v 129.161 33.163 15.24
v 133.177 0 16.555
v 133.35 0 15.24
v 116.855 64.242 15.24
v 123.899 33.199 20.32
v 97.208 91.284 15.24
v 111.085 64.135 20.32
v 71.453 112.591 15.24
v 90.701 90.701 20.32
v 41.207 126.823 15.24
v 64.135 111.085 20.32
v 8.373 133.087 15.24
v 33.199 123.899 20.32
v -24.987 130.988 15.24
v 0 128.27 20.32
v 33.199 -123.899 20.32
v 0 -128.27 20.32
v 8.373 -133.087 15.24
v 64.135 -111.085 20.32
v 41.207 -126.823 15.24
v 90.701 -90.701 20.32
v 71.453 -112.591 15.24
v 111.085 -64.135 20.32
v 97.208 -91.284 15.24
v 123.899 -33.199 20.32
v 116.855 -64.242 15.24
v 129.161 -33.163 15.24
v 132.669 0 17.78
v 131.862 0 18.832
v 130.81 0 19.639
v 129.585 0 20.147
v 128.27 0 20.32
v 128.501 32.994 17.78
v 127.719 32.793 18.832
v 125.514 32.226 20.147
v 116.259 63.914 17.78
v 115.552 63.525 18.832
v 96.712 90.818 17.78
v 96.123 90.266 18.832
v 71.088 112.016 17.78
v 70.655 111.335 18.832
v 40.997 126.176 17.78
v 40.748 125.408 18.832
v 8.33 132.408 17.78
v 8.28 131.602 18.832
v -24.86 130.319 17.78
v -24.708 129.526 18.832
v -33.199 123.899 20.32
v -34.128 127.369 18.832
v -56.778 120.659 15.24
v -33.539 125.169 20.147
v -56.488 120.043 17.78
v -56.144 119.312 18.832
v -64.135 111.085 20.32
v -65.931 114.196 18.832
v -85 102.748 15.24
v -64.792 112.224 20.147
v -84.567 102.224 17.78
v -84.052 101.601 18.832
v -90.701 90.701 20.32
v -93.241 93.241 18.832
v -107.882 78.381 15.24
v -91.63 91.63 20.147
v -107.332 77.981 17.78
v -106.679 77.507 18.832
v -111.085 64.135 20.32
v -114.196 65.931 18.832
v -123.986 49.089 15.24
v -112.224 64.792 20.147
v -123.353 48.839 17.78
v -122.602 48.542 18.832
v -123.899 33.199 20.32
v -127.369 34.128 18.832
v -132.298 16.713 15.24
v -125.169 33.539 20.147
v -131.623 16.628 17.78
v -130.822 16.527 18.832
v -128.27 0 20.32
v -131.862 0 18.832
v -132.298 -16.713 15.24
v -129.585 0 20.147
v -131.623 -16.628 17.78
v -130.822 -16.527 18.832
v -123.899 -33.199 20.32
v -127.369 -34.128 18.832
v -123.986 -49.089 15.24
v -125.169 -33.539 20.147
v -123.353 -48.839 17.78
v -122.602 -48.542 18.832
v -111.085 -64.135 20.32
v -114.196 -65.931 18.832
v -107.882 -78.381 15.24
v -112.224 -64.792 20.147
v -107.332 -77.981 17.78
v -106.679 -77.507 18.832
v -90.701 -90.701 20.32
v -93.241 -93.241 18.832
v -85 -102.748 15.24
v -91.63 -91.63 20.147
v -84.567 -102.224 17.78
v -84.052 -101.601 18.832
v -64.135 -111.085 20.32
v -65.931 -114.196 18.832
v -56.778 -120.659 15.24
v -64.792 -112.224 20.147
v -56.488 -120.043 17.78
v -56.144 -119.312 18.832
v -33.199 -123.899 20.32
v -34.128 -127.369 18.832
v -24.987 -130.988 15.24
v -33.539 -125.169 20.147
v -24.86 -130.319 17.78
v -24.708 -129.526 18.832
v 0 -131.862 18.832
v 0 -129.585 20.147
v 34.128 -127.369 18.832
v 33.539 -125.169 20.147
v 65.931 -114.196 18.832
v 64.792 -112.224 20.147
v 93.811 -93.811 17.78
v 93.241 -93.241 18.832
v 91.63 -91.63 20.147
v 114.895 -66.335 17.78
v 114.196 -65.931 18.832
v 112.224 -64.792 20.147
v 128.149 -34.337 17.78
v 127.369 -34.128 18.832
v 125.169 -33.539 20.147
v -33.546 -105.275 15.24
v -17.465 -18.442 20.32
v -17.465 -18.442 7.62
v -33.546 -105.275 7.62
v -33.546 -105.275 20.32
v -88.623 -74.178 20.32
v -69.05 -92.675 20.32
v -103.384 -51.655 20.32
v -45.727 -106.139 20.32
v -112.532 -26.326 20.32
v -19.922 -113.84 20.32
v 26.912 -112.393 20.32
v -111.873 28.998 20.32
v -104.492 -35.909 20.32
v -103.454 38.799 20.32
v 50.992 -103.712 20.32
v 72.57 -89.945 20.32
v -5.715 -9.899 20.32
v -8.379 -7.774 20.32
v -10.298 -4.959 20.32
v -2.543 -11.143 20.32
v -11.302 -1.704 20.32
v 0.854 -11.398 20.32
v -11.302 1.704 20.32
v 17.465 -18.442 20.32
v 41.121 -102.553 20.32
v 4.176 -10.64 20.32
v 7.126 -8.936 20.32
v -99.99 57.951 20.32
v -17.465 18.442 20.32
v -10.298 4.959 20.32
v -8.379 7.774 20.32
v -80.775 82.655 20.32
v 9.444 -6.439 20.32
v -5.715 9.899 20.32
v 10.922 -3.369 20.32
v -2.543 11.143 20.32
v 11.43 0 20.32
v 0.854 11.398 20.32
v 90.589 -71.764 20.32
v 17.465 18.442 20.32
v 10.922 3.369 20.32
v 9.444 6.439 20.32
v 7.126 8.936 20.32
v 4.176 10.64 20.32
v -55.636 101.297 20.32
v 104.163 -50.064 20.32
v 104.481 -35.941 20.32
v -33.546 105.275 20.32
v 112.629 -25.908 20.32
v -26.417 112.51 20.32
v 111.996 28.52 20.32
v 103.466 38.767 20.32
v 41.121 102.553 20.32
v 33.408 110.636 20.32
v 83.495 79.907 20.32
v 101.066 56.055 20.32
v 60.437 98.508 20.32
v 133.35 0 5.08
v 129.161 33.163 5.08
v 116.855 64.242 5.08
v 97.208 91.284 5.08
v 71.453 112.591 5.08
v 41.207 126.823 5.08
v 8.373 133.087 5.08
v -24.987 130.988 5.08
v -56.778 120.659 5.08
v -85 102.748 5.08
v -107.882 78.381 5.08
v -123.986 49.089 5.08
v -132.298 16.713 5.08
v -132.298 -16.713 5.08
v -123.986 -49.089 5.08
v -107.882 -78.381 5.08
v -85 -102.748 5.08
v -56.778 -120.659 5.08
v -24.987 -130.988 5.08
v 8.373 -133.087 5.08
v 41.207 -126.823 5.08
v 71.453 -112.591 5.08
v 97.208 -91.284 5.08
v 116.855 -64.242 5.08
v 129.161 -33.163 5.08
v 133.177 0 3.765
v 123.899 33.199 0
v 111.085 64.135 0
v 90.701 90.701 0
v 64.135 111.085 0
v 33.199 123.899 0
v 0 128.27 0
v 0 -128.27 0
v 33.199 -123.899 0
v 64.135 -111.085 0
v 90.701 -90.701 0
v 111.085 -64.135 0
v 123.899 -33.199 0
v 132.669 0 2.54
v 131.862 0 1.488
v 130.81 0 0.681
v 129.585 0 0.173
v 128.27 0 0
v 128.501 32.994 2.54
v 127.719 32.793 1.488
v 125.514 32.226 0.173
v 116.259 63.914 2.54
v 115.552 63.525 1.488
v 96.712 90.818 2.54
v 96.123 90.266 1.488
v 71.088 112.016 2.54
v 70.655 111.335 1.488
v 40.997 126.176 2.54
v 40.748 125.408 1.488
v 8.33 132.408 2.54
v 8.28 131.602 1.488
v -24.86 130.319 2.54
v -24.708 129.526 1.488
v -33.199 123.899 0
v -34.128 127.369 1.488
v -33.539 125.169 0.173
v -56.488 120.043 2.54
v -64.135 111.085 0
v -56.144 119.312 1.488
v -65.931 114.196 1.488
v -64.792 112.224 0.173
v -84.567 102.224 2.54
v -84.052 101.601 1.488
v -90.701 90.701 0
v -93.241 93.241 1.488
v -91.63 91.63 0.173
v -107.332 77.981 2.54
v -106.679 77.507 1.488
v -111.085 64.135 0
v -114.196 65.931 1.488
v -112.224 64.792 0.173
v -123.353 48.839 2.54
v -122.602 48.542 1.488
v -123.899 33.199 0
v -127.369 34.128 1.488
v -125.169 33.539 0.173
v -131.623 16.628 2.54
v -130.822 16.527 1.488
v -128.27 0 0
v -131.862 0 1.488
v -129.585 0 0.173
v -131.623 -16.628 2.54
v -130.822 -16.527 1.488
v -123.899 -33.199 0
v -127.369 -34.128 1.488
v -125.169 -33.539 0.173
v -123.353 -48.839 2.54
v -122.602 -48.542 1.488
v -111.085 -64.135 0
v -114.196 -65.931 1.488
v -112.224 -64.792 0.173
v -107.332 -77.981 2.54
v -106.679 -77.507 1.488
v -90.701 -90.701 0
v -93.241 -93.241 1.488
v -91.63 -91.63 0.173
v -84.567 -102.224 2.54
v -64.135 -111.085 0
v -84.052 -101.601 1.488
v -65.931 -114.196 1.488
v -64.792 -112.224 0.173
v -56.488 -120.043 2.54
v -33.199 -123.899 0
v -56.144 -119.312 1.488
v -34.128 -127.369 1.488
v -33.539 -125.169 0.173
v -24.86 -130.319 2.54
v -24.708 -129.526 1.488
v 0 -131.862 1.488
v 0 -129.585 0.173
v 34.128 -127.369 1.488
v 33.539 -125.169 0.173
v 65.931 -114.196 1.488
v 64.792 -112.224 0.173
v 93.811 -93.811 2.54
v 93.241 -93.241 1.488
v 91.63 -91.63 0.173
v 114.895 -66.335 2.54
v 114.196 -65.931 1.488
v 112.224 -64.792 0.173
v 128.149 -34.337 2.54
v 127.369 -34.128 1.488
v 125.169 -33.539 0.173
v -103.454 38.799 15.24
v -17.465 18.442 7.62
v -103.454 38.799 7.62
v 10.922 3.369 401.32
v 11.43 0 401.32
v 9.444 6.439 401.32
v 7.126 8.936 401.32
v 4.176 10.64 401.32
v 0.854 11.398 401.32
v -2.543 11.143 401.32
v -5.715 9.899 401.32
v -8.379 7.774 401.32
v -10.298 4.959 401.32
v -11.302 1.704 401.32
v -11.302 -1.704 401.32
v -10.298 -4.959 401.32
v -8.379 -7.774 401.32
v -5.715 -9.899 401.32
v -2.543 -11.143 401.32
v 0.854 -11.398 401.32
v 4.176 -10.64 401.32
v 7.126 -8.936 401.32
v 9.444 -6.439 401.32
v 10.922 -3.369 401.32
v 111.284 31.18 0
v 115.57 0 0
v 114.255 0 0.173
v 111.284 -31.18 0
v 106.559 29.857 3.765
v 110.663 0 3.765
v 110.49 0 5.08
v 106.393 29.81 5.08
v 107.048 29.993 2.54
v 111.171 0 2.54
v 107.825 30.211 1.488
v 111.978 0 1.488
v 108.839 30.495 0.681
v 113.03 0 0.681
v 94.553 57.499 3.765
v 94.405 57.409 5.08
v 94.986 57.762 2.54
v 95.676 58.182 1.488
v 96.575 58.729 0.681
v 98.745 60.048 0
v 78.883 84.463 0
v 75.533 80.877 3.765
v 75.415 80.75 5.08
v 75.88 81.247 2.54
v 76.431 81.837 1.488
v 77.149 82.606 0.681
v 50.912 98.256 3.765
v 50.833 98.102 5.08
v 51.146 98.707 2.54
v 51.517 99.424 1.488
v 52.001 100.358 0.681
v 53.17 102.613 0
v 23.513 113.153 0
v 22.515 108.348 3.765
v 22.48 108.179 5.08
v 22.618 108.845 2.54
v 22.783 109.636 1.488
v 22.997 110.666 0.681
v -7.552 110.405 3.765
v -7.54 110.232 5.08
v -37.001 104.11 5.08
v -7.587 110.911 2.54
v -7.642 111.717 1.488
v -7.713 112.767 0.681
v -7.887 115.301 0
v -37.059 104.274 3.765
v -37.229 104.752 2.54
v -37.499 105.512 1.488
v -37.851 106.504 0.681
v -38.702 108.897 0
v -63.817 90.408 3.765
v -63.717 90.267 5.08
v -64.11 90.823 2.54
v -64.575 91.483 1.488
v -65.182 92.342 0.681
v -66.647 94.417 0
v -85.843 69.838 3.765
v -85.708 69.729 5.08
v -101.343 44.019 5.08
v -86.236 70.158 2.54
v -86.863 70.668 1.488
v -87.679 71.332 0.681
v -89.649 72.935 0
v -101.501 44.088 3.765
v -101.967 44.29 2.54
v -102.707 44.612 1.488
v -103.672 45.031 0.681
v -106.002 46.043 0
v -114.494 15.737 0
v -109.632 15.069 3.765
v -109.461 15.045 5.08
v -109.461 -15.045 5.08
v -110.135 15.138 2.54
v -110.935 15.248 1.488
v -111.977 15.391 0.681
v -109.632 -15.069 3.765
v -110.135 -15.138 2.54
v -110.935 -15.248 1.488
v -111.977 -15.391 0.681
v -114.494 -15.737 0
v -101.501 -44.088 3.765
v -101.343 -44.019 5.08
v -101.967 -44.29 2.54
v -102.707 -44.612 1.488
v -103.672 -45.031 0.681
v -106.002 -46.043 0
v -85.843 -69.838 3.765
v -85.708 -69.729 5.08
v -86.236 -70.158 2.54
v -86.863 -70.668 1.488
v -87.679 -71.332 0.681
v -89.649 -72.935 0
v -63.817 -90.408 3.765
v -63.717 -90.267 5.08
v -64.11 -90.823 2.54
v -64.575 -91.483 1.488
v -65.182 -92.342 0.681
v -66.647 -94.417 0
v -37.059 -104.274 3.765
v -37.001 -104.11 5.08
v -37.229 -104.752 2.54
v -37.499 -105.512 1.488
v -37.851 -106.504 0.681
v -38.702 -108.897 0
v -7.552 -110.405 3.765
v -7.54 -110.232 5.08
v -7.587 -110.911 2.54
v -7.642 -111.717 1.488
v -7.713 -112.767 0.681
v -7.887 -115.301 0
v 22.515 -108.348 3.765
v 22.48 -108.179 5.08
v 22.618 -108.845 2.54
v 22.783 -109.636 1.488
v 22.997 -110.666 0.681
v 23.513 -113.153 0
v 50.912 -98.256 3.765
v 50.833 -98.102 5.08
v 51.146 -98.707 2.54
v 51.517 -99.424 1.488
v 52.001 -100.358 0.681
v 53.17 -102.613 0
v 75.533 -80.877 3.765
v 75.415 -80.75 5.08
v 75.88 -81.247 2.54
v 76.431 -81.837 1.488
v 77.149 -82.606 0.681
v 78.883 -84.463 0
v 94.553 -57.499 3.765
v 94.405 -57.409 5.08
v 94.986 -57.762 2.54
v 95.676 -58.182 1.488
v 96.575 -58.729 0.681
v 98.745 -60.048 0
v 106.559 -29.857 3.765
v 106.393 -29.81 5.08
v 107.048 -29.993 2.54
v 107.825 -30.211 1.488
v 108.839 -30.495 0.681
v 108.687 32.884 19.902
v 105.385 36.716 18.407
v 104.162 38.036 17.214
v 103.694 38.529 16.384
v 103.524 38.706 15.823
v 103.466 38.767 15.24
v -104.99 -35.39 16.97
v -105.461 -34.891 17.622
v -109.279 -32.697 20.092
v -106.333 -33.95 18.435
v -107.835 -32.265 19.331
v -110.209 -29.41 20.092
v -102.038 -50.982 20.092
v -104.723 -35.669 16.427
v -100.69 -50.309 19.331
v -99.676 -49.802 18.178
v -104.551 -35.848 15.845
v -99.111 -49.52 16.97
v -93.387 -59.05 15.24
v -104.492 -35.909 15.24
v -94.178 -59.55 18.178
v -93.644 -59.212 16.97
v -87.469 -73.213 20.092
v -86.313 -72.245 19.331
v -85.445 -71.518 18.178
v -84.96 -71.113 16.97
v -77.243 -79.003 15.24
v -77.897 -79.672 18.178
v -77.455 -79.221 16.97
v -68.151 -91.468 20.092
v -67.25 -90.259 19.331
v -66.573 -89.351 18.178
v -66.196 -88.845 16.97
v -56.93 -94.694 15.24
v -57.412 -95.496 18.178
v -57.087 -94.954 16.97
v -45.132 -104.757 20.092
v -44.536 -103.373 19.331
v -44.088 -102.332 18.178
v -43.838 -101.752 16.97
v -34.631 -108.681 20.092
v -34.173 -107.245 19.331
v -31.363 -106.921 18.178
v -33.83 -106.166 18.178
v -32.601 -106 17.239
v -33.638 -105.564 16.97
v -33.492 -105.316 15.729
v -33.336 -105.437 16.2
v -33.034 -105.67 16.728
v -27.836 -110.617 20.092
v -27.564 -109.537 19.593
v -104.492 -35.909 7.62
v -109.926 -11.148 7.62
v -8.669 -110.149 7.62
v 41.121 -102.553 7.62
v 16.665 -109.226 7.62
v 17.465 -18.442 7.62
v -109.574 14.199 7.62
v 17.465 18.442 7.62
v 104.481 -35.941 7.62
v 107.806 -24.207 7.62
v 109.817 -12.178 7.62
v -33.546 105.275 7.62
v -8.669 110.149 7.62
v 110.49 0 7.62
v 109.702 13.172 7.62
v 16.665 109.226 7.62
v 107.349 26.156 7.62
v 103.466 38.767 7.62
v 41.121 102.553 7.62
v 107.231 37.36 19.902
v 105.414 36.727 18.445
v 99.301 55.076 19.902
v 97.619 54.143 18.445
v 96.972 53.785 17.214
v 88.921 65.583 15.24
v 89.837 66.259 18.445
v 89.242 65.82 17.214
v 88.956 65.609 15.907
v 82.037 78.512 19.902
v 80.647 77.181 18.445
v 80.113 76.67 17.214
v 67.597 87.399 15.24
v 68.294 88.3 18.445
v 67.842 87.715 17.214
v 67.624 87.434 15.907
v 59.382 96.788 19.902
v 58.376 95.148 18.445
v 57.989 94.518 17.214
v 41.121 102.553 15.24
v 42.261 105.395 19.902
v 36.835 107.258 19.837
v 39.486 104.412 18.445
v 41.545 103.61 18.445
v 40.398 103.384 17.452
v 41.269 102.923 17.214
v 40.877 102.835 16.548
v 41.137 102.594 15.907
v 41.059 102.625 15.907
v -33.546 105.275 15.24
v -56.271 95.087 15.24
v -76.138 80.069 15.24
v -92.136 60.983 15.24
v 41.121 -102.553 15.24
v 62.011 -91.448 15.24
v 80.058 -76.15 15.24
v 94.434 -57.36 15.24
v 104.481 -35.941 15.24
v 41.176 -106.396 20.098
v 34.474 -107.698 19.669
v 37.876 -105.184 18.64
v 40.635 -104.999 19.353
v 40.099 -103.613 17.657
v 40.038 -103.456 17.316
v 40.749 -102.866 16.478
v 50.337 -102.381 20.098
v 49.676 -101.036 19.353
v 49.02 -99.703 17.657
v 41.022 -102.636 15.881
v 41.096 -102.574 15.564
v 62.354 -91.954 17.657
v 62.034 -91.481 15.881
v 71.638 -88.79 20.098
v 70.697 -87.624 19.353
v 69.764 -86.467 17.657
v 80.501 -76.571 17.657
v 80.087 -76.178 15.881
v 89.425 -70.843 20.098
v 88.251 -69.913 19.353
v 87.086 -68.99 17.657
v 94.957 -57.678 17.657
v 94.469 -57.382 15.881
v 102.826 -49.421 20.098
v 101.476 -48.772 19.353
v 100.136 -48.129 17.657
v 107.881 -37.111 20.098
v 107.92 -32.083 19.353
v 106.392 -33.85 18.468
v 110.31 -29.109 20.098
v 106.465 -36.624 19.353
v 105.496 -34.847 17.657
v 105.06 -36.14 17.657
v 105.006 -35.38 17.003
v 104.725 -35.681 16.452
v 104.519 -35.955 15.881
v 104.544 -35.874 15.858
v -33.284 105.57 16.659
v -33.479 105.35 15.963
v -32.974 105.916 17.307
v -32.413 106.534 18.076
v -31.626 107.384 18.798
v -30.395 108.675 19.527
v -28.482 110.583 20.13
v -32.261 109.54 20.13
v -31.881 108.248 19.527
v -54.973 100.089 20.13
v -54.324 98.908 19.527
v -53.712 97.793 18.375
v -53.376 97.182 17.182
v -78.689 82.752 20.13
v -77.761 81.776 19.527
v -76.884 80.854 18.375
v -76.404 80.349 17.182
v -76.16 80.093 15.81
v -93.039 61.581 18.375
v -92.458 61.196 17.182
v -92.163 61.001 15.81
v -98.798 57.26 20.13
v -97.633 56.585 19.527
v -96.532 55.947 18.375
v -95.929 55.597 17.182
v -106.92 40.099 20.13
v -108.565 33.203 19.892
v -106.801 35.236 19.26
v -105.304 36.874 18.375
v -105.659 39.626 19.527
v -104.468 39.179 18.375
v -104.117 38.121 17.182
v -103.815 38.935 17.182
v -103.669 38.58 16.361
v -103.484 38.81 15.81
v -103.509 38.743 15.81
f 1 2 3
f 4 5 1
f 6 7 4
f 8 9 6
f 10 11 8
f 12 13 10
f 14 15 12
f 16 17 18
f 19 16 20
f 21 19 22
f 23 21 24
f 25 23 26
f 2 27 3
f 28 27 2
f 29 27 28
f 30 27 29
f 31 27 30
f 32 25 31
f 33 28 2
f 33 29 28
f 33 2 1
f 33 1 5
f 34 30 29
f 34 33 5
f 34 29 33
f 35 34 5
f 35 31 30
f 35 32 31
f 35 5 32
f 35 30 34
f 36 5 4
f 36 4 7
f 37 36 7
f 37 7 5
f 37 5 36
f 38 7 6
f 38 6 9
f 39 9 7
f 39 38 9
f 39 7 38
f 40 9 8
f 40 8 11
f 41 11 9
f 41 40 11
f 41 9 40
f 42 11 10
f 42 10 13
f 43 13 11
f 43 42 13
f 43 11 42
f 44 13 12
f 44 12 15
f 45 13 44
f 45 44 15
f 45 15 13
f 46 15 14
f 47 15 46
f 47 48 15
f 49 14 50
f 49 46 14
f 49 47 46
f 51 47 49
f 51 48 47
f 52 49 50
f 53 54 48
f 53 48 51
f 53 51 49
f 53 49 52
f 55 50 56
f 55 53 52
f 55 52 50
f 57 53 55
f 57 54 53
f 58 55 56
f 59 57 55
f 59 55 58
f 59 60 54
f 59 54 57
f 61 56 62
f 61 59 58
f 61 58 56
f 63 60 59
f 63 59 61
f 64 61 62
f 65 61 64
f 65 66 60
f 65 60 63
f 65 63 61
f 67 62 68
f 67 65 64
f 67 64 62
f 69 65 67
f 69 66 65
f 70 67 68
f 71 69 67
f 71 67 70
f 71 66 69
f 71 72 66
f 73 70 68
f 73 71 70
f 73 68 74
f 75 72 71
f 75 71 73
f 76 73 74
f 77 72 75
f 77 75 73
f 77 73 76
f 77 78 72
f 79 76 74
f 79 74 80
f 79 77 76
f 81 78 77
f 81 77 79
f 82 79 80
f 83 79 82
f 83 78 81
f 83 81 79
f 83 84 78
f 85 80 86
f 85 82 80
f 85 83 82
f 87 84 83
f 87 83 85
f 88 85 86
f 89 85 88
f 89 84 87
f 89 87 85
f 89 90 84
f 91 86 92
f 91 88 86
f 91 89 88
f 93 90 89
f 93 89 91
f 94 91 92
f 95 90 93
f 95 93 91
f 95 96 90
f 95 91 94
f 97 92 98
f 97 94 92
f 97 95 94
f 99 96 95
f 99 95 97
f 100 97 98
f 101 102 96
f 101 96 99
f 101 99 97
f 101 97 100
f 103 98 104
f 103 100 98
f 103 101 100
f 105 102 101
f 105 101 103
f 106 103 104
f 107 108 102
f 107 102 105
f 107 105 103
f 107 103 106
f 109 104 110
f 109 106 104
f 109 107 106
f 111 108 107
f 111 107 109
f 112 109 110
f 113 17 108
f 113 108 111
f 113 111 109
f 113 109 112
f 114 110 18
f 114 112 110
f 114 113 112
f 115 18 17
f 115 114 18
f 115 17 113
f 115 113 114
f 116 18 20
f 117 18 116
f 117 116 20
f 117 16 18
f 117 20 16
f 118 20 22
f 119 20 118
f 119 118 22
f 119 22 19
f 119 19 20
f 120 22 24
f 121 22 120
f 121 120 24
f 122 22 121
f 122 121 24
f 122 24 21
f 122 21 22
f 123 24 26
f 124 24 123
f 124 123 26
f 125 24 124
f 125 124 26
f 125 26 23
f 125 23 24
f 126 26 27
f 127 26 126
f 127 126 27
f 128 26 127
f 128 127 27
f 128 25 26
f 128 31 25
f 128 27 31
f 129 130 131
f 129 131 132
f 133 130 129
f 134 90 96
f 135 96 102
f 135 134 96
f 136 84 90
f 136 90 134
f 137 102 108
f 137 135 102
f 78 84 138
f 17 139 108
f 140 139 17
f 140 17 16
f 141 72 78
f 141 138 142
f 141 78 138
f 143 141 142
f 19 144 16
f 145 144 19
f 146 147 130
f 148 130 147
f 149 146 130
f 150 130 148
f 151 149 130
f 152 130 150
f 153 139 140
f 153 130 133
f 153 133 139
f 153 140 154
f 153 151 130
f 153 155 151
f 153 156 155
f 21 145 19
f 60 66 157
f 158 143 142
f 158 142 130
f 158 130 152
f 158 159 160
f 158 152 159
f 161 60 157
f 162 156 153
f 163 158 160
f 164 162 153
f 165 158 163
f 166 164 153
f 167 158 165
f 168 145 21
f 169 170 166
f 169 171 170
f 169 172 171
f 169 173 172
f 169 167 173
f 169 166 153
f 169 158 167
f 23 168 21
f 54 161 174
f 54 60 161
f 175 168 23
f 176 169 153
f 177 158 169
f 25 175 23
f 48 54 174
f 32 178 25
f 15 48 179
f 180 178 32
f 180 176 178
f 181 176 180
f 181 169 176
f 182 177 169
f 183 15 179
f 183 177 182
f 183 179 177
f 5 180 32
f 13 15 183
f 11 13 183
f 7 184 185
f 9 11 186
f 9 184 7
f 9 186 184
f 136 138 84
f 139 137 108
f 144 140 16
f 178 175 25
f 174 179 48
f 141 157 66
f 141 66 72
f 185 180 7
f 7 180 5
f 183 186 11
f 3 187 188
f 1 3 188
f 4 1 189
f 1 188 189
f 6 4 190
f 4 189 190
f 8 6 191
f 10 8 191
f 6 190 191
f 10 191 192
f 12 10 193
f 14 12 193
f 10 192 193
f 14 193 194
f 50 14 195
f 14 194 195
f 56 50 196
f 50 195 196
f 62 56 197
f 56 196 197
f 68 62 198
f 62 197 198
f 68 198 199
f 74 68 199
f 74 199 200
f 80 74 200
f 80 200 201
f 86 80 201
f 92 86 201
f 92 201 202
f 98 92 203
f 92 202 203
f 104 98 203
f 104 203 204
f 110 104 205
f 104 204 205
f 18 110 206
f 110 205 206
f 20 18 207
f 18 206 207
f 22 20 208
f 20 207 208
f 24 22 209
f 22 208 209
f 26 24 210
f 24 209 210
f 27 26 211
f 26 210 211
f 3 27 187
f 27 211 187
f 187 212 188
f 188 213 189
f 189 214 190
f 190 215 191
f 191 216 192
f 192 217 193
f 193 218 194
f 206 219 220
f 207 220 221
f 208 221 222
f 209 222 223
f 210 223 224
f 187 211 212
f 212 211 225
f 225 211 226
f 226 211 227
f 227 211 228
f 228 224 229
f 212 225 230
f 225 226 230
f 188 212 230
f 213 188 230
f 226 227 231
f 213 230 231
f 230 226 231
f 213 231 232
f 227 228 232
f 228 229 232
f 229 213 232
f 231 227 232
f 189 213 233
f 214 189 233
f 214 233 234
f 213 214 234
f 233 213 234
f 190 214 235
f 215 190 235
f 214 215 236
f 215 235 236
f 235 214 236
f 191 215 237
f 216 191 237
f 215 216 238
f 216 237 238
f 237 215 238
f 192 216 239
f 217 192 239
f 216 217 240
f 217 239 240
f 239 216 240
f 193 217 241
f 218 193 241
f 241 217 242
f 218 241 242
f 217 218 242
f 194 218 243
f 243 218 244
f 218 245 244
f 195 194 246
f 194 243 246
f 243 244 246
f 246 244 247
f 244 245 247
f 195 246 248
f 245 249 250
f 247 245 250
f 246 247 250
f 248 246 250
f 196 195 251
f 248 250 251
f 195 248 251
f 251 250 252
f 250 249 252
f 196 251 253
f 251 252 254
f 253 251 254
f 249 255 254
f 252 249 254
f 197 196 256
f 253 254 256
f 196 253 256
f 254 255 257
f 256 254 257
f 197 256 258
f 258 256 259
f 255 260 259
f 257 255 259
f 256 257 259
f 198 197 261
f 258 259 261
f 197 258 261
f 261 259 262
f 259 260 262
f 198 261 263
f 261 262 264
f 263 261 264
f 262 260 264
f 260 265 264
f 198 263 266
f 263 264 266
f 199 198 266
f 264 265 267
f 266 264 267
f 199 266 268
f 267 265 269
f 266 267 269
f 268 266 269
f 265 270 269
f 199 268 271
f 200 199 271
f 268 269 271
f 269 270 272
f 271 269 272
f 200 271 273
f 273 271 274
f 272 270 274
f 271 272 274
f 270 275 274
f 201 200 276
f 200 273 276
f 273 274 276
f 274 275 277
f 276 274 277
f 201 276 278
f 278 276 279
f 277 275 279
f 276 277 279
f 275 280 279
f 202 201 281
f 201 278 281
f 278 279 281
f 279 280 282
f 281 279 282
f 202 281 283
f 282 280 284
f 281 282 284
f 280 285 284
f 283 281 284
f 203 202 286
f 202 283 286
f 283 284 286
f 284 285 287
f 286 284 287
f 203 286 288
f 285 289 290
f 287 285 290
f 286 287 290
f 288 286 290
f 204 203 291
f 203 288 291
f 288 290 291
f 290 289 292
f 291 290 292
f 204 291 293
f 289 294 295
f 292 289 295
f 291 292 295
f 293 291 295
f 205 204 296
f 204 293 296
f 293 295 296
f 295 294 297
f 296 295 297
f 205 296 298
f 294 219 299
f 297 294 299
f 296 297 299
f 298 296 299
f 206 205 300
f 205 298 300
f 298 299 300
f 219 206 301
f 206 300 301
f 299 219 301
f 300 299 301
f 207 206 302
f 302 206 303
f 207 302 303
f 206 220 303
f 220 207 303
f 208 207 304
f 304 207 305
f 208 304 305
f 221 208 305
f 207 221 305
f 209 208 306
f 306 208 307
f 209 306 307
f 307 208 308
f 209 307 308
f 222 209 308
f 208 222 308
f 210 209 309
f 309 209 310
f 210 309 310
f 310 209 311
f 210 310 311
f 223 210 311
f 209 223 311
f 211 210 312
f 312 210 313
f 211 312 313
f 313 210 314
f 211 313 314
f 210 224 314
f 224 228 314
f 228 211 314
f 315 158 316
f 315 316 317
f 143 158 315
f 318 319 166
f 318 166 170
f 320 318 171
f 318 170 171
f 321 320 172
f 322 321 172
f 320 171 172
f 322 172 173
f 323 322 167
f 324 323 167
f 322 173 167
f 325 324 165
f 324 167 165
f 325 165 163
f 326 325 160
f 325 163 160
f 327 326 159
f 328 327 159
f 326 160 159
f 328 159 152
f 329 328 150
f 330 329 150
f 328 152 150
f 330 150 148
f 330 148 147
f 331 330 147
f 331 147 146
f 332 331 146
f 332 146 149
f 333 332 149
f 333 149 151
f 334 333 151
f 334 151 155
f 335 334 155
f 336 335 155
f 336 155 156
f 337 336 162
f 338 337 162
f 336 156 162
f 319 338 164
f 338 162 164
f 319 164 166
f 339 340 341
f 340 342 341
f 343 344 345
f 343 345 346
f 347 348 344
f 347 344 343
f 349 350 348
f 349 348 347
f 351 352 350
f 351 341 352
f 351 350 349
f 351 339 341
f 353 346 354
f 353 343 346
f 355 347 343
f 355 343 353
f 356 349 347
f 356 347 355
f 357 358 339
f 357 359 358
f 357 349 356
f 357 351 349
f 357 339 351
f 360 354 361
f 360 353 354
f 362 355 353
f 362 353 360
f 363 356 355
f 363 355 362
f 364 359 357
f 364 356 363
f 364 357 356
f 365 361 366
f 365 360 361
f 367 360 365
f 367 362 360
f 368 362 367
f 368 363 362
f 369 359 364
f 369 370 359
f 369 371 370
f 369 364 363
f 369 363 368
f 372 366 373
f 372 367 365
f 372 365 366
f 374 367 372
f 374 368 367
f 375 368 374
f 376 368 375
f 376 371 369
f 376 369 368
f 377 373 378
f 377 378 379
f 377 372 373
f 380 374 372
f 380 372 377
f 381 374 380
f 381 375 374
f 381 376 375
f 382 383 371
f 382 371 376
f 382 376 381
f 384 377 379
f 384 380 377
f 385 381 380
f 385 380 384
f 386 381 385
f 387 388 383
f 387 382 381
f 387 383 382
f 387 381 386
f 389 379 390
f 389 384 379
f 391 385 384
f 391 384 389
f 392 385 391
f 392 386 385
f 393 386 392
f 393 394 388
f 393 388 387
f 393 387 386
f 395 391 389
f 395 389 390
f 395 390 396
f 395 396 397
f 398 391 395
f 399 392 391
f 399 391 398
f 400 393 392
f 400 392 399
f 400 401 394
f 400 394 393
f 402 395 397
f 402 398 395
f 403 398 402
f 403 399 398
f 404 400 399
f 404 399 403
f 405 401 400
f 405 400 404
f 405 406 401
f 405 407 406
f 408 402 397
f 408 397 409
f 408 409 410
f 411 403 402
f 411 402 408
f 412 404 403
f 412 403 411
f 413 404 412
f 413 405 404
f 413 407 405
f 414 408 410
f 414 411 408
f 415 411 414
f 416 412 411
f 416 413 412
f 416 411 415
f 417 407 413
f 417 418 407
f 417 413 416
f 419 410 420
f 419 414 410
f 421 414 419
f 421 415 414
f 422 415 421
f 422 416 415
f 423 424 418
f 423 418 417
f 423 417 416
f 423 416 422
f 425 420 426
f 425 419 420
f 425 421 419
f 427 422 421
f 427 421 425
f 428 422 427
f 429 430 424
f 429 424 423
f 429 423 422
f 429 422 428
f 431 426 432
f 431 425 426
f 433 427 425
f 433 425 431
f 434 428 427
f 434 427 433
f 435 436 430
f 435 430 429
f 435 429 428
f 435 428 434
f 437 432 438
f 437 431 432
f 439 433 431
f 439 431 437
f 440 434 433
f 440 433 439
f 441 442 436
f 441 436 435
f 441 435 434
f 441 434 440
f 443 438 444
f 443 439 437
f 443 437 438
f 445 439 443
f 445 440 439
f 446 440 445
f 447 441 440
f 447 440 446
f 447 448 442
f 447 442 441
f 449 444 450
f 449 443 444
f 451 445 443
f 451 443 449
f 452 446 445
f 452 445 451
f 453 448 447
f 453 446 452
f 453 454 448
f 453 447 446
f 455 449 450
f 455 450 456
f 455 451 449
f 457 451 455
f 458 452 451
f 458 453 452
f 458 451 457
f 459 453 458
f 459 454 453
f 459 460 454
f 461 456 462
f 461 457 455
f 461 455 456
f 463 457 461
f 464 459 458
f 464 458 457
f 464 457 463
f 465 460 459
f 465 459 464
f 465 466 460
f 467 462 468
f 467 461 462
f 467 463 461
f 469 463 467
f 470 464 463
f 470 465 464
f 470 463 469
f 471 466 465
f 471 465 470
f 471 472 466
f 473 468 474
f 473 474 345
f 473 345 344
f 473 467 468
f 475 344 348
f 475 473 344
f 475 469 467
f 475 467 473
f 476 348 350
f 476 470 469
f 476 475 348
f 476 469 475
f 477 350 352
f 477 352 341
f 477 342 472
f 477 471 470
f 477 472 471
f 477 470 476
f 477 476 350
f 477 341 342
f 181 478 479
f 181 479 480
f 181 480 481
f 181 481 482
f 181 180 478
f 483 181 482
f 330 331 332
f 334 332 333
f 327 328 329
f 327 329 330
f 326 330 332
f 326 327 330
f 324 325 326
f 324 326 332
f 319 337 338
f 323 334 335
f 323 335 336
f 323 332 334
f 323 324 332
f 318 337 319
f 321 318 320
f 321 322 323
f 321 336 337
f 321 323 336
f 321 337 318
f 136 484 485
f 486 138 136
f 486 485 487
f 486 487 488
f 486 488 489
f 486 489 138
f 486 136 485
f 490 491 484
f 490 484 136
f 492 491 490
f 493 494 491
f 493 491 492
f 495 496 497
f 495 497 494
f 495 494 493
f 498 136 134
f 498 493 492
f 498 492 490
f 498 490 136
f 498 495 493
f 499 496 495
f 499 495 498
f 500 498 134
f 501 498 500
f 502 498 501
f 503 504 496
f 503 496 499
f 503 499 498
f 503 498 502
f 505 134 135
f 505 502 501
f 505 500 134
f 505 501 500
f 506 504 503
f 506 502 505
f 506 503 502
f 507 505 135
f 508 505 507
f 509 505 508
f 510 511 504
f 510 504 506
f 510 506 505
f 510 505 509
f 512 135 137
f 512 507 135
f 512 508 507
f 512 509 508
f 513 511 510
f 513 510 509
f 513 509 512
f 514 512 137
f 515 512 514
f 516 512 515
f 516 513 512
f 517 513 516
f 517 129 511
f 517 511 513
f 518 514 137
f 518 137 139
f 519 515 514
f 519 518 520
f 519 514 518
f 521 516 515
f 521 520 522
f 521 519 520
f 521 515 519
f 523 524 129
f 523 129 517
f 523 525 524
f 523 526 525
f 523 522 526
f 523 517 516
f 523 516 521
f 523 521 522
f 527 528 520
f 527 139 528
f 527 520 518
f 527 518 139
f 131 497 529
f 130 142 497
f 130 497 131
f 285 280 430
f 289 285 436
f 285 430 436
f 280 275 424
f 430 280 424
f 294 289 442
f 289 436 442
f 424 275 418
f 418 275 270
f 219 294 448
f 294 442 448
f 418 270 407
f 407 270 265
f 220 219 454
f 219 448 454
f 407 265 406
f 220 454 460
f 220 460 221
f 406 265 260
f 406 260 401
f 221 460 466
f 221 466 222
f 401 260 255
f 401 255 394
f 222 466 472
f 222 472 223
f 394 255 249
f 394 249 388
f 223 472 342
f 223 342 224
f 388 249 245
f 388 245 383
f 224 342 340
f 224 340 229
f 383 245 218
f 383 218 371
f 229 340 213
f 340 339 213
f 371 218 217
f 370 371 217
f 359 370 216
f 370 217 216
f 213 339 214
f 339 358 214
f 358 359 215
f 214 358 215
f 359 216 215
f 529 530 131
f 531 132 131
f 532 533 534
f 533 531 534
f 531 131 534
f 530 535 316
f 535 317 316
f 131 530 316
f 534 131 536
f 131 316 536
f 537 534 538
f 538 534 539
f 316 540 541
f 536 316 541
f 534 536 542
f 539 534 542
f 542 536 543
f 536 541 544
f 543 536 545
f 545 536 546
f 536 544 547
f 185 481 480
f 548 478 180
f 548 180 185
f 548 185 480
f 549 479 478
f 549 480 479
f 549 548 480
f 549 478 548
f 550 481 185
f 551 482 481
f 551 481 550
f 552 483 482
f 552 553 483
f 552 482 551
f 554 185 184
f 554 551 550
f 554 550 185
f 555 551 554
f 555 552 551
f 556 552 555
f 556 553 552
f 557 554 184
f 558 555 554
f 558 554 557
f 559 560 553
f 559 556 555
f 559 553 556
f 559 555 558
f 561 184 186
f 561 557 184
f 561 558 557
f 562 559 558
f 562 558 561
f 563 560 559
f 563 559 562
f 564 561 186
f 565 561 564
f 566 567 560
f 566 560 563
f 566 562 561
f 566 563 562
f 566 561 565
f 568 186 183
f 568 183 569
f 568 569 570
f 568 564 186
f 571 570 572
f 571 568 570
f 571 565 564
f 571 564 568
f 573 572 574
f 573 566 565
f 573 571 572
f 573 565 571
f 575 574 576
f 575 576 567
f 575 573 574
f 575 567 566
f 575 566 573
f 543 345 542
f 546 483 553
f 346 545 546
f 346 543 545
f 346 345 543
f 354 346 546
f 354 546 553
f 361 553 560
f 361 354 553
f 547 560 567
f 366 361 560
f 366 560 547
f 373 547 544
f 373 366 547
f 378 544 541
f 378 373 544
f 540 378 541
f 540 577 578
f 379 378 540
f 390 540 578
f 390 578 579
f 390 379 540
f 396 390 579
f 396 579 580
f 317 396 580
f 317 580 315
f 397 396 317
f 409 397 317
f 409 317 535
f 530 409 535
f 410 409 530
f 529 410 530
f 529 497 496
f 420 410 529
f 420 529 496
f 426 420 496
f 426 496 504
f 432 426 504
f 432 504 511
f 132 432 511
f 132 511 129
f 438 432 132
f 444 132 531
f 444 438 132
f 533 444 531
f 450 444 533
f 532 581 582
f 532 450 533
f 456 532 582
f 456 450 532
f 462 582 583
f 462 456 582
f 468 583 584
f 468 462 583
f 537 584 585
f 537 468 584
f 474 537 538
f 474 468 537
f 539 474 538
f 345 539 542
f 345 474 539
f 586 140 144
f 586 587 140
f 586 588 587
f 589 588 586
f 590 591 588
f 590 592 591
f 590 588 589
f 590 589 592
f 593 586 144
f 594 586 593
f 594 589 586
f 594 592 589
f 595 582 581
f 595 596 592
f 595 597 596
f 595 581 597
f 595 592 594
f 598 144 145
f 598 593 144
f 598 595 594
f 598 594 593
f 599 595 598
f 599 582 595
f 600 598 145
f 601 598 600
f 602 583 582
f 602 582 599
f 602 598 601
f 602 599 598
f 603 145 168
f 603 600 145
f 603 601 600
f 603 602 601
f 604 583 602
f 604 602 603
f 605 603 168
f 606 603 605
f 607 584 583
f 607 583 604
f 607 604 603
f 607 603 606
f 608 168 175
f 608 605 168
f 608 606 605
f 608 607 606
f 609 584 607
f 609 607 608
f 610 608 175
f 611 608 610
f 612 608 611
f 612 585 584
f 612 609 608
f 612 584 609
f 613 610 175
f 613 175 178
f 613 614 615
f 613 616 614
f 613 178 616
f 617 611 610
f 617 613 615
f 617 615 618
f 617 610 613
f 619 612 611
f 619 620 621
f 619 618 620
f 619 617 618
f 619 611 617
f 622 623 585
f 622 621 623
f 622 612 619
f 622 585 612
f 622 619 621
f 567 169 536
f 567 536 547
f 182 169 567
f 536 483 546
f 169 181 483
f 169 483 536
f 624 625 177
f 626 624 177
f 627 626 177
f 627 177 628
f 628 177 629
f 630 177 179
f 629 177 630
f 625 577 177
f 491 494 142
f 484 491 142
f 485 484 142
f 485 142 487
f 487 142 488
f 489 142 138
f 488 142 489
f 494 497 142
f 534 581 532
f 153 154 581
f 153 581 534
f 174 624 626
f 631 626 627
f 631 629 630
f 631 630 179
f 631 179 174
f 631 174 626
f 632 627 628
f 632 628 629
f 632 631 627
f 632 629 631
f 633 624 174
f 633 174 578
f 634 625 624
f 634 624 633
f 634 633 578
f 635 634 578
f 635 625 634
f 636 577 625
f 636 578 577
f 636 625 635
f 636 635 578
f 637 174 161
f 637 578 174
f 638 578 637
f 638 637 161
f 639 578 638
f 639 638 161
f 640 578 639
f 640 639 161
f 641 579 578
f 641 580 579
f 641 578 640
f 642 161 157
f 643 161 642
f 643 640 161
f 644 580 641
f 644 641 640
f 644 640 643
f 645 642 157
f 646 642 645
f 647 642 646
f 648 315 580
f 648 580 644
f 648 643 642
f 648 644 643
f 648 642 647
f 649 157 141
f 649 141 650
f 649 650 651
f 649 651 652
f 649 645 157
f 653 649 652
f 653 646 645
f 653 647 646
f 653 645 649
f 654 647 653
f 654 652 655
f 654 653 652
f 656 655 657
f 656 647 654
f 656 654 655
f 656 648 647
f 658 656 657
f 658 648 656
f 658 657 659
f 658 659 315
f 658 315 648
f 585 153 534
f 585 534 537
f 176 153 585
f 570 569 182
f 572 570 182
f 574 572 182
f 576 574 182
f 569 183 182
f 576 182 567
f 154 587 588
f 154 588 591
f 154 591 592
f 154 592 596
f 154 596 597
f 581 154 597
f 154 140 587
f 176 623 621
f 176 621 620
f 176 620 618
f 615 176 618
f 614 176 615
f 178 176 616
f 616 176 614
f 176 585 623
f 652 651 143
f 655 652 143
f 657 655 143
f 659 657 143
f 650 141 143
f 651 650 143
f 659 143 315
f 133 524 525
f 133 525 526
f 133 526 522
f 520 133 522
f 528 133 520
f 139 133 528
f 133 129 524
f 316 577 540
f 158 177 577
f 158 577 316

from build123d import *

# Parameters (mm, degrees)
SKETCH1_R           = 133.35
SKETCH1_R_2         = 110.49
BOSS_EXTRUDE1_DEPTH = 20.32
FILLET1_R           = 5.08
FILLET4_R           = 5.08
FILLET5_R           = 5.08
FILLET6_R           = 5.08
SKETCH2_R           = 25.4
BOSS_EXTRUDE2_DEPTH = 12.7
SKETCH3_R           = 11.43
BOSS_EXTRUDE3_DEPTH = 381


with BuildPart() as part:
    # Sketch1 → Boss-Extrude1 (new body)
    with BuildSketch(Plane.XY):
        Circle(SKETCH1_R)
        Circle(SKETCH1_R_2, mode=Mode.SUBTRACT)
    extrude(amount=BOSS_EXTRUDE1_DEPTH)

    # Fillet1
    fillet1_edges = [part.edges().sort_by_distance(p)[0] for p in [
        (-133.35, 0, 20.32),
    ]]
    fillet(fillet1_edges, radius=FILLET1_R)

    # Fillet4
    fillet4_edges = [part.edges().sort_by_distance(p)[0] for p in [
        (-133.35, 0, 0),
    ]]
    fillet(fillet4_edges, radius=FILLET4_R)

    # Fillet5
    fillet5_edges = [part.edges().sort_by_distance(p)[0] for p in [
        (-110.49, 0, 20.32),
    ]]
    fillet(fillet5_edges, radius=FILLET5_R)

    # Fillet6
    fillet6_edges = [part.edges().sort_by_distance(p)[0] for p in [
        (-110.49, 0, 0),
    ]]
    fillet(fillet6_edges, radius=FILLET6_R)



with BuildPart() as body_2:
    # Sketch2 → Boss-Extrude2 (new body)
    with BuildSketch(Plane.XY.offset(20.32)):
        with BuildLine():
            add(Edge.make_bspline(
                [(111.995773379, 28.519671196), (108.395461325, 33.640925655), (103.465758881, 38.766955506)],
                knots=[0.86323948, 0.86323948, 0.86323948, 1, 1, 1], degree=2))
            Line((103.465758881, 38.766955506), (17.465361403, 18.442373791))
            ThreePointArc((17.465361403, 18.442373791), (23.332168562, 10.038421698), (25.4, 0))
            ThreePointArc((25.4, 0), (23.332168562, -10.038421698), (17.465361403, -18.442373791))
            Line((17.465361403, -18.442373791), (104.480917214, -35.941313806))
            add(Edge.make_bspline(
                [(104.480917214, -35.941313806), (109.199570697, -30.926942984), (112.628608991, -25.907939648)],
                knots=[0, 0, 0, 0.134699054, 0.134699054, 0.134699054], degree=2))
            ThreePointArc((112.628608991, -25.907939648), (114.832297811, -13.037188327), (115.57, 0))
            ThreePointArc((115.57, 0), (114.672962004, 14.37138425), (111.995773379, 28.519671196))
        make_face()
        with BuildLine():
            ThreePointArc((-17.465361403, 18.442373791), (0, 25.4), (17.465361403, 18.442373791))
            Line((17.465361403, 18.442373791), (41.120888712, 102.55297466))
            add(Edge.make_bspline(
                [(33.408134269, 110.6359863), (37.257292789, 107.035833442), (41.120888712, 102.55297466)],
                knots=[0.898413925, 0.898413925, 0.898413925, 1, 1, 1], degree=2))
            ThreePointArc((33.408134269, 110.6359863), (3.618968694, 115.513323758), (-26.417084957, 112.510277408))
            add(Edge.make_bspline(
                [(-33.5455644, 105.274570572), (-29.987921782, 109.295772293), (-26.417084957, 112.510277408)],
                knots=[0, 0, 0, 0.097113874, 0.097113874, 0.097113874], degree=2))
            Line((-33.5455644, 105.274570572), (-17.465361403, 18.442373791))
        make_face()
        with BuildLine():
            Line((41.120888883, -102.552974591), (17.465361403, -18.442373791))
            ThreePointArc((17.465361403, -18.442373791), (0, -25.4), (-17.465361403, -18.442373791))
            Line((-17.465361403, -18.442373791), (-33.545564575, -105.274570516))
            add(Edge.make_bspline(
                [(-33.545564575, -105.274570516), (-26.738144431, -110.571915765), (-19.922448027, -113.839891798)],
                knots=[0, 0, 0, 0.182948004, 0.182948004, 0.182948004], degree=2))
            ThreePointArc((-19.922448027, -113.839891798), (3.568860133, -115.514882753), (26.911965601, -112.392931306))
            add(Edge.make_bspline(
                [(26.911965601, -112.392931306), (34.011973832, -108.564945177), (41.120888883, -102.552974591)],
                knots=[0.810210618, 0.810210618, 0.810210618, 1, 1, 1], degree=2))
        make_face()
        with BuildLine():
            ThreePointArc((-17.465361403, -18.442373791), (-25.4, 0), (-17.465361403, 18.442373791))
            Line((-17.465361403, 18.442373791), (-103.453712161, 38.799092001))
            add(Edge.make_bspline(
                [(-111.872978372, 28.997613871), (-108.286344087, 33.895850119), (-103.453712161, 38.799092001)],
                knots=[0.869248391, 0.869248391, 0.869248391, 1, 1, 1], degree=2))
            ThreePointArc((-111.872978372, 28.997613871), (-115.56181287, 1.375611191), (-112.531537583, -26.326373643))
            add(Edge.make_bspline(
                [(-104.492035357, -35.908977246), (-109.115451856, -31.120100592), (-112.531537583, -26.326373643)],
                knots=[0, 0, 0, 0.128706822, 0.128706822, 0.128706822], degree=2))
            Line((-104.492035357, -35.908977246), (-17.465361403, -18.442373791))
        make_face()
        Circle(SKETCH2_R)
    extrude(amount=-BOSS_EXTRUDE2_DEPTH)


with BuildPart() as part_1:
    add(part.part)

    add(body_2.part)  # Boss-Extrude3 merges body 2
    # Sketch3 → Boss-Extrude3 (add)
    with BuildSketch(Plane.XY.offset(20.32)):
        Circle(SKETCH3_R)
    extrude(amount=BOSS_EXTRUDE3_DEPTH)


solid = part_1.part
